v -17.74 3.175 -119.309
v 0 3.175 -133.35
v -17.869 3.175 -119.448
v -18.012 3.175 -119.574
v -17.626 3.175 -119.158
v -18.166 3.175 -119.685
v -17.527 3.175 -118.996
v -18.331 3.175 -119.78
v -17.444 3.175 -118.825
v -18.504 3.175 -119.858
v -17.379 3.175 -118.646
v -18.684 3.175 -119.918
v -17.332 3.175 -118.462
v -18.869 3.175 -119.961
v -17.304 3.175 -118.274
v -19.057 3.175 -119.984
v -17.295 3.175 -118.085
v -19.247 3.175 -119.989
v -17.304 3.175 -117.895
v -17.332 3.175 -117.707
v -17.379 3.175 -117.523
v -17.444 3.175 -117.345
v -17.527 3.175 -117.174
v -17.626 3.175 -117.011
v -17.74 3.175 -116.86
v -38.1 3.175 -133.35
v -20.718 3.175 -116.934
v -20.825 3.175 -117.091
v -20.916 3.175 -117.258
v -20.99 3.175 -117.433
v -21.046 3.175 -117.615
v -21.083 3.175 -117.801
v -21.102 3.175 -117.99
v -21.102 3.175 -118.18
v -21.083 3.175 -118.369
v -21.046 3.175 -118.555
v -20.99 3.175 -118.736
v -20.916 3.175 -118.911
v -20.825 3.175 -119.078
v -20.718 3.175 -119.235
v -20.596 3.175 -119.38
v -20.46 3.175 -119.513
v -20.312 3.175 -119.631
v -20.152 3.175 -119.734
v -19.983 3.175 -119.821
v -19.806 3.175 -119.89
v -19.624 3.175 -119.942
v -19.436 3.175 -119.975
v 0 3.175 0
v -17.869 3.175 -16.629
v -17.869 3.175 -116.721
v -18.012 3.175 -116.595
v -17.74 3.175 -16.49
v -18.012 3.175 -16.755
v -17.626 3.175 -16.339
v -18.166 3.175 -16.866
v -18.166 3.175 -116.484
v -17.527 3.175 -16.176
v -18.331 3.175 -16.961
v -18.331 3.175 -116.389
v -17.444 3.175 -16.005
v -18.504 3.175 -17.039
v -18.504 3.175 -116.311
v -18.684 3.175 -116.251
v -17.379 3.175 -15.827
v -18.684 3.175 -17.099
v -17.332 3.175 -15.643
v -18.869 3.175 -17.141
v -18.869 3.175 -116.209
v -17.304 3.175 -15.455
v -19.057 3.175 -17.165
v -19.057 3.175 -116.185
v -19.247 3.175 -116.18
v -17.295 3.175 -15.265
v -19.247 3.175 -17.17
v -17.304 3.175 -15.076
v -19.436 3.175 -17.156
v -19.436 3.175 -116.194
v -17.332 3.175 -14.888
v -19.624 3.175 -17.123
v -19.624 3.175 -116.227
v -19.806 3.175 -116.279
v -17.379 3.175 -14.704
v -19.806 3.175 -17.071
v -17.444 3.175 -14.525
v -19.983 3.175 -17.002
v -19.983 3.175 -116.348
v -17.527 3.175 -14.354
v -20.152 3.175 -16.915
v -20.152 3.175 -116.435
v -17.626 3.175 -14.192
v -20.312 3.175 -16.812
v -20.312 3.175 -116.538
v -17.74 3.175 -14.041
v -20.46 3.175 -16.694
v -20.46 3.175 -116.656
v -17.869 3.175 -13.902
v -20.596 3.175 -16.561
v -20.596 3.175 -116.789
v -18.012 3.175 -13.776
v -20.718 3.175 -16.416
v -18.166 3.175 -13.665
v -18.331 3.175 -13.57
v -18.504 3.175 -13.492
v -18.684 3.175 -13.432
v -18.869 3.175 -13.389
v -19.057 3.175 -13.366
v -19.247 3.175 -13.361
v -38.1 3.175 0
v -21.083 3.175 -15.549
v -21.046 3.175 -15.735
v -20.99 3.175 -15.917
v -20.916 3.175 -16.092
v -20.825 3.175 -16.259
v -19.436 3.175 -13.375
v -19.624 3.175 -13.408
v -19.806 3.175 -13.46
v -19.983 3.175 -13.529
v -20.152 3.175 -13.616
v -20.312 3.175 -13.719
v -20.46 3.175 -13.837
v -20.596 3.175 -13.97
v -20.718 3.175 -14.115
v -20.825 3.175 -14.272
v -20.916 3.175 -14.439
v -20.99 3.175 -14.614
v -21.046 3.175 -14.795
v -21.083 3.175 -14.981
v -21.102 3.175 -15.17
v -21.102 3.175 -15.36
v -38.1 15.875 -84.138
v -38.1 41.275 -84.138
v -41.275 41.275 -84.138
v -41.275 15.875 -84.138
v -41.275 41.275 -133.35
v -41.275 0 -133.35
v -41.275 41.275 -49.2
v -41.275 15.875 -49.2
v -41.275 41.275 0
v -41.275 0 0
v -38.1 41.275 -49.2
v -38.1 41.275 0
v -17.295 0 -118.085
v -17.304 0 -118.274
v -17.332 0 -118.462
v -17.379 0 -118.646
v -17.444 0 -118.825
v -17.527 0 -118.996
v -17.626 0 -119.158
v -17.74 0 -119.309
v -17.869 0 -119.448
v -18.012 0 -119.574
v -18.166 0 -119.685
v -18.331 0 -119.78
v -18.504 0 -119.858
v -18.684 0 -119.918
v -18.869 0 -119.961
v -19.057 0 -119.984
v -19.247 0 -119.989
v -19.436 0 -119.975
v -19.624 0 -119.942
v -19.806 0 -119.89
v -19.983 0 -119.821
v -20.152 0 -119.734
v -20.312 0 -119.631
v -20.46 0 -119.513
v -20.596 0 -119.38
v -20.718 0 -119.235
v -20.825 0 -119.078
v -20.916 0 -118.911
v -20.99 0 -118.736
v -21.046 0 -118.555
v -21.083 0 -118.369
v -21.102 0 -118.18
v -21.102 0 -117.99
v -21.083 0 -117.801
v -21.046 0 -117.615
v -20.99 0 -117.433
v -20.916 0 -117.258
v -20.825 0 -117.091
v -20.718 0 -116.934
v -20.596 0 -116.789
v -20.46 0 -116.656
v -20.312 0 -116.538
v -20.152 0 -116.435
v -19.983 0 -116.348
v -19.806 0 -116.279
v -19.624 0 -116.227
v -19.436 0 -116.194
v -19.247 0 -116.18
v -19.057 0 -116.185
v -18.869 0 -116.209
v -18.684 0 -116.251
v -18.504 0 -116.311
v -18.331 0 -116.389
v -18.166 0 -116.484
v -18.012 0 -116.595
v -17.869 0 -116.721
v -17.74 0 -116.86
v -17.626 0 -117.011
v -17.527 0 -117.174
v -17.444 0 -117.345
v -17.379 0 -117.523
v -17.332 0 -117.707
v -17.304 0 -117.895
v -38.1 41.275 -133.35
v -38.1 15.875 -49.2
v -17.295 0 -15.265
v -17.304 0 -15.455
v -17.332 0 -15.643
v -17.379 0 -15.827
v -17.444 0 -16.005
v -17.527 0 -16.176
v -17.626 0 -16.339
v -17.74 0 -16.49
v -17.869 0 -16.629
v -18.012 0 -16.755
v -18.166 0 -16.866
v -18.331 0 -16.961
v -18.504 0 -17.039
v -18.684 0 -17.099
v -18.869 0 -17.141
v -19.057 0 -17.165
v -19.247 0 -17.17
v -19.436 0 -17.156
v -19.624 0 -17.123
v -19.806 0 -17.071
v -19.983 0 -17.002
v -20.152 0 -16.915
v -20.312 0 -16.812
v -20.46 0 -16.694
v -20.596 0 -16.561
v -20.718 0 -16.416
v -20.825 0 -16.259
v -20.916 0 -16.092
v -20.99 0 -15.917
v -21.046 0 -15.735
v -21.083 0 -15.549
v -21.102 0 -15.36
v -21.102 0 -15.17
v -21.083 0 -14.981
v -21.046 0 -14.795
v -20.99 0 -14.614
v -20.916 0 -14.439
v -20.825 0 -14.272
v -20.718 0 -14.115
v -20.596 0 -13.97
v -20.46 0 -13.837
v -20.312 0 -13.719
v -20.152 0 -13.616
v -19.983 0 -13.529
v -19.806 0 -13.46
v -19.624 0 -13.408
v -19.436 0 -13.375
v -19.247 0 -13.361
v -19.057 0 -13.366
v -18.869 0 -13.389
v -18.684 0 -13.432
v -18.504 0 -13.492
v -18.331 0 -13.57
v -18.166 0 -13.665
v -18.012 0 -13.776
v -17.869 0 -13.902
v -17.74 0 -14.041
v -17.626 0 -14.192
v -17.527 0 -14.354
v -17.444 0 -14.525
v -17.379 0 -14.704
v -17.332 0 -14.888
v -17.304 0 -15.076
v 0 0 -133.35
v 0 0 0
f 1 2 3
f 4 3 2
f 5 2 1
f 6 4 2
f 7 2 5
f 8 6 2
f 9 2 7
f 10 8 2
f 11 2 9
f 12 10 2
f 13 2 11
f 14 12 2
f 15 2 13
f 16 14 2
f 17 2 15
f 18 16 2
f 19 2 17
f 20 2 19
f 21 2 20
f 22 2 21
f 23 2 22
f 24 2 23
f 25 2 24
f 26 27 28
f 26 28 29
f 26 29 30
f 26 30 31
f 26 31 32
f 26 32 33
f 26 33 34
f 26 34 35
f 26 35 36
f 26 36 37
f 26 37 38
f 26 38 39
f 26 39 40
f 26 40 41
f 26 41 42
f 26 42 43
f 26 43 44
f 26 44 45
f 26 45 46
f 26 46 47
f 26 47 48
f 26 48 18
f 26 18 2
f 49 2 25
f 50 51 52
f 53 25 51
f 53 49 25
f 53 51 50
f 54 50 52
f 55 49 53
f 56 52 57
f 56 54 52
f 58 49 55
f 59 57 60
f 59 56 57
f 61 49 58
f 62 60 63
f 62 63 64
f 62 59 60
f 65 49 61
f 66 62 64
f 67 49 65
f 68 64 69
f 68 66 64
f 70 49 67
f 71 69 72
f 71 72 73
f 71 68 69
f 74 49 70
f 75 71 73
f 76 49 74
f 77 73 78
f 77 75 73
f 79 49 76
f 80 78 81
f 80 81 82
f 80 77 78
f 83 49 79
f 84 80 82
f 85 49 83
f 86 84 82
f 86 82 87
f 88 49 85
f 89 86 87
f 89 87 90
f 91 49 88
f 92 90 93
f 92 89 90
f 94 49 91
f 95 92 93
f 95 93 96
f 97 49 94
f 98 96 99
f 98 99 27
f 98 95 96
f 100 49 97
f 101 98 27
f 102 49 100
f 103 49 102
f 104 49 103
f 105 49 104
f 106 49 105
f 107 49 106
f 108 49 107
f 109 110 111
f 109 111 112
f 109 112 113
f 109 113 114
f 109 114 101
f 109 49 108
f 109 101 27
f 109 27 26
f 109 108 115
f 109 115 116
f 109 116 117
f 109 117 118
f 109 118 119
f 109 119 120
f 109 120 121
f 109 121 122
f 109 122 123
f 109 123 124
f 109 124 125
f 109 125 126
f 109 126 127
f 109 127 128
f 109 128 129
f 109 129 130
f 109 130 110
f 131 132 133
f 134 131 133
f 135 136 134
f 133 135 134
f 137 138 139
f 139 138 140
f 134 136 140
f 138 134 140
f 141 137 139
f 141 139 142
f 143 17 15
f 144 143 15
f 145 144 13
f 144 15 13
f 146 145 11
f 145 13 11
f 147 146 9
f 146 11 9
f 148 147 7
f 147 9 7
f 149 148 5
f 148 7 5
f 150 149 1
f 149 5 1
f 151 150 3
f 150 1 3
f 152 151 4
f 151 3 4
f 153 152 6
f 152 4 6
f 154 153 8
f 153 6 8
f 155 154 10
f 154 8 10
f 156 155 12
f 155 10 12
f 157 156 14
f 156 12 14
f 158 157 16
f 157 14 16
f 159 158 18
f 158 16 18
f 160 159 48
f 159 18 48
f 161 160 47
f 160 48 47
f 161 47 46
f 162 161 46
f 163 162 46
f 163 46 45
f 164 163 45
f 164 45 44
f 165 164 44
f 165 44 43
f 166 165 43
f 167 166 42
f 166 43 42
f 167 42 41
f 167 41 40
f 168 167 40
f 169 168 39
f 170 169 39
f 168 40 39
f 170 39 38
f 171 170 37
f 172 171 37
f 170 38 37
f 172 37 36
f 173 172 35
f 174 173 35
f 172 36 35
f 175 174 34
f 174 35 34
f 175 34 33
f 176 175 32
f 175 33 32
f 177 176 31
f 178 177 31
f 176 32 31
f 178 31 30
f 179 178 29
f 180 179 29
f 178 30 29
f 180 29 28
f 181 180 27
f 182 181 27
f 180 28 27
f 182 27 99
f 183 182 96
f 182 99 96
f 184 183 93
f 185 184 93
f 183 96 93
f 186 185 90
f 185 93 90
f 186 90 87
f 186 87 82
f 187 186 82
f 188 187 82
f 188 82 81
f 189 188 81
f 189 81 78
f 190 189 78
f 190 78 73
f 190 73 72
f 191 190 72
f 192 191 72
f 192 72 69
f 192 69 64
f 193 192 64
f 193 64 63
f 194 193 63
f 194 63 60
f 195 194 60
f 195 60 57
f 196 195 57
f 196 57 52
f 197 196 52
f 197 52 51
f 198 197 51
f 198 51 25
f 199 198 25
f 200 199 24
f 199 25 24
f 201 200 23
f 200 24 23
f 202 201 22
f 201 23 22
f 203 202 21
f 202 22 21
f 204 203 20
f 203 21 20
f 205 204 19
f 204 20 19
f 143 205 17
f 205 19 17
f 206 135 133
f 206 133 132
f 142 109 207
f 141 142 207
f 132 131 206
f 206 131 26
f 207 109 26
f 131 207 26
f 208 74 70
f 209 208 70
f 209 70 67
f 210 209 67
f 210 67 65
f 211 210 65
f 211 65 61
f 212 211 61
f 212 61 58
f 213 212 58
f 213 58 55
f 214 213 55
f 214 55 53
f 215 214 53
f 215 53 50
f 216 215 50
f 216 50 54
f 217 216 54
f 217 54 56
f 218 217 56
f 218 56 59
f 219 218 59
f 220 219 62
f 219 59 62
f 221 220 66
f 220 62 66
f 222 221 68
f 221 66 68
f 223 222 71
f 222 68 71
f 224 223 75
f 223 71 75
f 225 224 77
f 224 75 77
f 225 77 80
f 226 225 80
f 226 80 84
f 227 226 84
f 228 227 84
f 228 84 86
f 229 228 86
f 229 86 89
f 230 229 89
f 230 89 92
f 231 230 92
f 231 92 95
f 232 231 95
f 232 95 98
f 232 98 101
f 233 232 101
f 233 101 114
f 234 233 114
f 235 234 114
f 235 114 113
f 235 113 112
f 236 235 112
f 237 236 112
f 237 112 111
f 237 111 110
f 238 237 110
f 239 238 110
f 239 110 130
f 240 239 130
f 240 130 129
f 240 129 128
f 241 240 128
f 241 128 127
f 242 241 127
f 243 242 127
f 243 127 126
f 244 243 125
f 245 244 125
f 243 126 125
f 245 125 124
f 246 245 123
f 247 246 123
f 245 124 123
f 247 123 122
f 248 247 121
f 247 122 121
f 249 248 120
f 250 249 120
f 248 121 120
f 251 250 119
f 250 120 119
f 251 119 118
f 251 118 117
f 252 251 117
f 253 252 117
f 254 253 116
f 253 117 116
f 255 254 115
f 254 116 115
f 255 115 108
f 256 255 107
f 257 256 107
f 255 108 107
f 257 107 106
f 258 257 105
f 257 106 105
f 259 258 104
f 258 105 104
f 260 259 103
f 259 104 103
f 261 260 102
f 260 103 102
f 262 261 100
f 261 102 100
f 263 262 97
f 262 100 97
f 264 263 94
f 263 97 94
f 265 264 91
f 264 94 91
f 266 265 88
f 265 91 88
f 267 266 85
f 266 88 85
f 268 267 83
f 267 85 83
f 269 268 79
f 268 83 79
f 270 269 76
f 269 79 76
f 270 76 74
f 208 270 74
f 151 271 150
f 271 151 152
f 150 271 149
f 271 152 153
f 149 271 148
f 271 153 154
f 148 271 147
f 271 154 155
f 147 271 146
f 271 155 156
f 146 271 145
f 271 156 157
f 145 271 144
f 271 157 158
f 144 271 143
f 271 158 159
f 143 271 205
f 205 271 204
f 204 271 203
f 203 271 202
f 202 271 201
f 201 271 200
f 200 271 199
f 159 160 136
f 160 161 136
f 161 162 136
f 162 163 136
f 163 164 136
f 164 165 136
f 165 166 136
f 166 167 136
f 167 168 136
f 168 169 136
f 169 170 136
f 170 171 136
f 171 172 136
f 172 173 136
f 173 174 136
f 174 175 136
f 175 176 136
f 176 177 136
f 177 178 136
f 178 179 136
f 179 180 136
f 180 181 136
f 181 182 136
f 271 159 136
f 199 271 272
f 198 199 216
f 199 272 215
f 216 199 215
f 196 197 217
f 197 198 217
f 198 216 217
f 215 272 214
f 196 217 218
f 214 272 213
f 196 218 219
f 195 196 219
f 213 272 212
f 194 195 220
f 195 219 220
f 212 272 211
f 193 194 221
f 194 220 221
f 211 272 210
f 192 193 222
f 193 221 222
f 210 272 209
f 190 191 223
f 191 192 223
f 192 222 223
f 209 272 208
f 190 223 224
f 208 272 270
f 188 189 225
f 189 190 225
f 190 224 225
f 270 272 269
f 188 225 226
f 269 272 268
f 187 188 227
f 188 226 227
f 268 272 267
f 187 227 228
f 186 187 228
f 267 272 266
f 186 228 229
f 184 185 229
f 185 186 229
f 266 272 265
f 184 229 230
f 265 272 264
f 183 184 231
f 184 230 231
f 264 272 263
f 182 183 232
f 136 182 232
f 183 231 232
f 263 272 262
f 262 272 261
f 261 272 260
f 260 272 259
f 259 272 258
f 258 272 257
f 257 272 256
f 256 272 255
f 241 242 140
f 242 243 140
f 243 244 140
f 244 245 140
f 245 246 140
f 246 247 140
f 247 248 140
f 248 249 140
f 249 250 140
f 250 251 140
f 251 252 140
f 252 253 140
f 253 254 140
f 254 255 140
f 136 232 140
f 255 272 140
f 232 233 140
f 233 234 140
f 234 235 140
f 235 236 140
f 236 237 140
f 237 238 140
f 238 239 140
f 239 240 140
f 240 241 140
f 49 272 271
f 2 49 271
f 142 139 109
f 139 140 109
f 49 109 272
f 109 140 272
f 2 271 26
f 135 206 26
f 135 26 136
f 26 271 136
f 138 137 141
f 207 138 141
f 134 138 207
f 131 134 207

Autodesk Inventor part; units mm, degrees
ref_plane "YZ Plane" through (0, 0, 0) normal (1, 0, 0) x (0, 1, 0)
ref_plane "XZ Plane" through (0, 0, 0) normal (0, 1, 0) x (-1, 0, 0)
ref_plane "XY Plane" through (0, 0, 0) normal (0, 0, 1) x (1, 0, 0)
sketch "Sketch1" plane through (0, 0, 0) normal (0, 1, 0) x (-1, 0, 0)
  line L0 (0, 0) -> (0, -133.35)
  line L1 (0, -133.35) -> (41.275, -133.35)
  line L2 (41.275, -133.35) -> (41.275, 0)
  line L3 (41.275, 0) -> (0, 0)
  dimension "d0" = 133.35
  dimension "d1" = 41.275
extrude "Extrusion1" add sketch "Sketch1" along normal blind 3.175
sketch "Sketch2" plane through (0, 3.175, 0) normal (0, 1, 0) x (1, 0, 0)
  line L0 (-41.275, 133.35) -> (-41.275, 0) projected
  line L1 (-41.275, 0) -> (-38.1, 0)
  line L2 (-41.275, 0) -> (0, 0) projected
  line L3 (-38.1, 0) -> (-38.1, 133.35)
  line L4 (0, 133.35) -> (-41.275, 133.35) projected
  line L5 (-41.275, 133.35) -> (-41.275, 0)
  dimension "d4" = 3.175
extrude "Extrusion2" add sketch "Sketch2" along normal blind 38.1
sketch "Sketch3" plane through (0, 41.275, 0) normal (0, 1, 0) x (1, 0, 0)
  line L0 (-41.275, 133.35) -> (-41.275, 0) projected
  line L1 (-41.275, 66.675) -> (-41.275, 84.1375)
  line L2 (-41.275, 66.675) -> (-41.275, 49.1998)
  line L3 (-41.275, 49.1998) -> (-38.1, 49.1998)
  line L4 (-38.1, 0) -> (-38.1, 133.35) projected
  line L5 (-38.1, 84.1375) -> (-41.275, 84.1375)
  line L6 (-38.1, 49.1998) -> (-38.1, 84.1375)
  point P0 (0, 0)
  dimension "d7" = 17.4625
  dimension "d8" = 17.4752
extrude "Extrusion3" cut sketch "Sketch3" against normal blind 25.4
sketch "Sketch4" plane through (0, 3.175, 0) normal (0, 1, 0) x (1, 0, 0)
  line L0 (0, 133.35) -> (-38.1, 133.35) projected
  point P0 (0, 0)
sketch "Sketch5" plane through (0, 3.175, 0) normal (0, 1, 0) x (1, 0, 0)
  line L0 (0, 0) -> (0, 133.35) projected
  line L1 (0, 66.675) -> (-38.3992, 66.675)
  line L2 (-19.1996, 66.675) -> (-19.1996, 118.0846)
  line L3 (-19.1996, 66.675) -> (-19.1996, 15.2654)
  circle A0 centre (-19.1996, 15.2654) radius 1.905
  circle A1 centre (-19.1996, 118.0846) radius 1.905
  dimension "d12" = 51.4096
  dimension "d13" = 51.4096
  dimension "d14" = 3.81
  dimension "d15" = 3.81
extrude "Extrusion4" cut sketch "Sketch5" against normal blind 20.6375
properties part number "cut top wheel mout thingy"
